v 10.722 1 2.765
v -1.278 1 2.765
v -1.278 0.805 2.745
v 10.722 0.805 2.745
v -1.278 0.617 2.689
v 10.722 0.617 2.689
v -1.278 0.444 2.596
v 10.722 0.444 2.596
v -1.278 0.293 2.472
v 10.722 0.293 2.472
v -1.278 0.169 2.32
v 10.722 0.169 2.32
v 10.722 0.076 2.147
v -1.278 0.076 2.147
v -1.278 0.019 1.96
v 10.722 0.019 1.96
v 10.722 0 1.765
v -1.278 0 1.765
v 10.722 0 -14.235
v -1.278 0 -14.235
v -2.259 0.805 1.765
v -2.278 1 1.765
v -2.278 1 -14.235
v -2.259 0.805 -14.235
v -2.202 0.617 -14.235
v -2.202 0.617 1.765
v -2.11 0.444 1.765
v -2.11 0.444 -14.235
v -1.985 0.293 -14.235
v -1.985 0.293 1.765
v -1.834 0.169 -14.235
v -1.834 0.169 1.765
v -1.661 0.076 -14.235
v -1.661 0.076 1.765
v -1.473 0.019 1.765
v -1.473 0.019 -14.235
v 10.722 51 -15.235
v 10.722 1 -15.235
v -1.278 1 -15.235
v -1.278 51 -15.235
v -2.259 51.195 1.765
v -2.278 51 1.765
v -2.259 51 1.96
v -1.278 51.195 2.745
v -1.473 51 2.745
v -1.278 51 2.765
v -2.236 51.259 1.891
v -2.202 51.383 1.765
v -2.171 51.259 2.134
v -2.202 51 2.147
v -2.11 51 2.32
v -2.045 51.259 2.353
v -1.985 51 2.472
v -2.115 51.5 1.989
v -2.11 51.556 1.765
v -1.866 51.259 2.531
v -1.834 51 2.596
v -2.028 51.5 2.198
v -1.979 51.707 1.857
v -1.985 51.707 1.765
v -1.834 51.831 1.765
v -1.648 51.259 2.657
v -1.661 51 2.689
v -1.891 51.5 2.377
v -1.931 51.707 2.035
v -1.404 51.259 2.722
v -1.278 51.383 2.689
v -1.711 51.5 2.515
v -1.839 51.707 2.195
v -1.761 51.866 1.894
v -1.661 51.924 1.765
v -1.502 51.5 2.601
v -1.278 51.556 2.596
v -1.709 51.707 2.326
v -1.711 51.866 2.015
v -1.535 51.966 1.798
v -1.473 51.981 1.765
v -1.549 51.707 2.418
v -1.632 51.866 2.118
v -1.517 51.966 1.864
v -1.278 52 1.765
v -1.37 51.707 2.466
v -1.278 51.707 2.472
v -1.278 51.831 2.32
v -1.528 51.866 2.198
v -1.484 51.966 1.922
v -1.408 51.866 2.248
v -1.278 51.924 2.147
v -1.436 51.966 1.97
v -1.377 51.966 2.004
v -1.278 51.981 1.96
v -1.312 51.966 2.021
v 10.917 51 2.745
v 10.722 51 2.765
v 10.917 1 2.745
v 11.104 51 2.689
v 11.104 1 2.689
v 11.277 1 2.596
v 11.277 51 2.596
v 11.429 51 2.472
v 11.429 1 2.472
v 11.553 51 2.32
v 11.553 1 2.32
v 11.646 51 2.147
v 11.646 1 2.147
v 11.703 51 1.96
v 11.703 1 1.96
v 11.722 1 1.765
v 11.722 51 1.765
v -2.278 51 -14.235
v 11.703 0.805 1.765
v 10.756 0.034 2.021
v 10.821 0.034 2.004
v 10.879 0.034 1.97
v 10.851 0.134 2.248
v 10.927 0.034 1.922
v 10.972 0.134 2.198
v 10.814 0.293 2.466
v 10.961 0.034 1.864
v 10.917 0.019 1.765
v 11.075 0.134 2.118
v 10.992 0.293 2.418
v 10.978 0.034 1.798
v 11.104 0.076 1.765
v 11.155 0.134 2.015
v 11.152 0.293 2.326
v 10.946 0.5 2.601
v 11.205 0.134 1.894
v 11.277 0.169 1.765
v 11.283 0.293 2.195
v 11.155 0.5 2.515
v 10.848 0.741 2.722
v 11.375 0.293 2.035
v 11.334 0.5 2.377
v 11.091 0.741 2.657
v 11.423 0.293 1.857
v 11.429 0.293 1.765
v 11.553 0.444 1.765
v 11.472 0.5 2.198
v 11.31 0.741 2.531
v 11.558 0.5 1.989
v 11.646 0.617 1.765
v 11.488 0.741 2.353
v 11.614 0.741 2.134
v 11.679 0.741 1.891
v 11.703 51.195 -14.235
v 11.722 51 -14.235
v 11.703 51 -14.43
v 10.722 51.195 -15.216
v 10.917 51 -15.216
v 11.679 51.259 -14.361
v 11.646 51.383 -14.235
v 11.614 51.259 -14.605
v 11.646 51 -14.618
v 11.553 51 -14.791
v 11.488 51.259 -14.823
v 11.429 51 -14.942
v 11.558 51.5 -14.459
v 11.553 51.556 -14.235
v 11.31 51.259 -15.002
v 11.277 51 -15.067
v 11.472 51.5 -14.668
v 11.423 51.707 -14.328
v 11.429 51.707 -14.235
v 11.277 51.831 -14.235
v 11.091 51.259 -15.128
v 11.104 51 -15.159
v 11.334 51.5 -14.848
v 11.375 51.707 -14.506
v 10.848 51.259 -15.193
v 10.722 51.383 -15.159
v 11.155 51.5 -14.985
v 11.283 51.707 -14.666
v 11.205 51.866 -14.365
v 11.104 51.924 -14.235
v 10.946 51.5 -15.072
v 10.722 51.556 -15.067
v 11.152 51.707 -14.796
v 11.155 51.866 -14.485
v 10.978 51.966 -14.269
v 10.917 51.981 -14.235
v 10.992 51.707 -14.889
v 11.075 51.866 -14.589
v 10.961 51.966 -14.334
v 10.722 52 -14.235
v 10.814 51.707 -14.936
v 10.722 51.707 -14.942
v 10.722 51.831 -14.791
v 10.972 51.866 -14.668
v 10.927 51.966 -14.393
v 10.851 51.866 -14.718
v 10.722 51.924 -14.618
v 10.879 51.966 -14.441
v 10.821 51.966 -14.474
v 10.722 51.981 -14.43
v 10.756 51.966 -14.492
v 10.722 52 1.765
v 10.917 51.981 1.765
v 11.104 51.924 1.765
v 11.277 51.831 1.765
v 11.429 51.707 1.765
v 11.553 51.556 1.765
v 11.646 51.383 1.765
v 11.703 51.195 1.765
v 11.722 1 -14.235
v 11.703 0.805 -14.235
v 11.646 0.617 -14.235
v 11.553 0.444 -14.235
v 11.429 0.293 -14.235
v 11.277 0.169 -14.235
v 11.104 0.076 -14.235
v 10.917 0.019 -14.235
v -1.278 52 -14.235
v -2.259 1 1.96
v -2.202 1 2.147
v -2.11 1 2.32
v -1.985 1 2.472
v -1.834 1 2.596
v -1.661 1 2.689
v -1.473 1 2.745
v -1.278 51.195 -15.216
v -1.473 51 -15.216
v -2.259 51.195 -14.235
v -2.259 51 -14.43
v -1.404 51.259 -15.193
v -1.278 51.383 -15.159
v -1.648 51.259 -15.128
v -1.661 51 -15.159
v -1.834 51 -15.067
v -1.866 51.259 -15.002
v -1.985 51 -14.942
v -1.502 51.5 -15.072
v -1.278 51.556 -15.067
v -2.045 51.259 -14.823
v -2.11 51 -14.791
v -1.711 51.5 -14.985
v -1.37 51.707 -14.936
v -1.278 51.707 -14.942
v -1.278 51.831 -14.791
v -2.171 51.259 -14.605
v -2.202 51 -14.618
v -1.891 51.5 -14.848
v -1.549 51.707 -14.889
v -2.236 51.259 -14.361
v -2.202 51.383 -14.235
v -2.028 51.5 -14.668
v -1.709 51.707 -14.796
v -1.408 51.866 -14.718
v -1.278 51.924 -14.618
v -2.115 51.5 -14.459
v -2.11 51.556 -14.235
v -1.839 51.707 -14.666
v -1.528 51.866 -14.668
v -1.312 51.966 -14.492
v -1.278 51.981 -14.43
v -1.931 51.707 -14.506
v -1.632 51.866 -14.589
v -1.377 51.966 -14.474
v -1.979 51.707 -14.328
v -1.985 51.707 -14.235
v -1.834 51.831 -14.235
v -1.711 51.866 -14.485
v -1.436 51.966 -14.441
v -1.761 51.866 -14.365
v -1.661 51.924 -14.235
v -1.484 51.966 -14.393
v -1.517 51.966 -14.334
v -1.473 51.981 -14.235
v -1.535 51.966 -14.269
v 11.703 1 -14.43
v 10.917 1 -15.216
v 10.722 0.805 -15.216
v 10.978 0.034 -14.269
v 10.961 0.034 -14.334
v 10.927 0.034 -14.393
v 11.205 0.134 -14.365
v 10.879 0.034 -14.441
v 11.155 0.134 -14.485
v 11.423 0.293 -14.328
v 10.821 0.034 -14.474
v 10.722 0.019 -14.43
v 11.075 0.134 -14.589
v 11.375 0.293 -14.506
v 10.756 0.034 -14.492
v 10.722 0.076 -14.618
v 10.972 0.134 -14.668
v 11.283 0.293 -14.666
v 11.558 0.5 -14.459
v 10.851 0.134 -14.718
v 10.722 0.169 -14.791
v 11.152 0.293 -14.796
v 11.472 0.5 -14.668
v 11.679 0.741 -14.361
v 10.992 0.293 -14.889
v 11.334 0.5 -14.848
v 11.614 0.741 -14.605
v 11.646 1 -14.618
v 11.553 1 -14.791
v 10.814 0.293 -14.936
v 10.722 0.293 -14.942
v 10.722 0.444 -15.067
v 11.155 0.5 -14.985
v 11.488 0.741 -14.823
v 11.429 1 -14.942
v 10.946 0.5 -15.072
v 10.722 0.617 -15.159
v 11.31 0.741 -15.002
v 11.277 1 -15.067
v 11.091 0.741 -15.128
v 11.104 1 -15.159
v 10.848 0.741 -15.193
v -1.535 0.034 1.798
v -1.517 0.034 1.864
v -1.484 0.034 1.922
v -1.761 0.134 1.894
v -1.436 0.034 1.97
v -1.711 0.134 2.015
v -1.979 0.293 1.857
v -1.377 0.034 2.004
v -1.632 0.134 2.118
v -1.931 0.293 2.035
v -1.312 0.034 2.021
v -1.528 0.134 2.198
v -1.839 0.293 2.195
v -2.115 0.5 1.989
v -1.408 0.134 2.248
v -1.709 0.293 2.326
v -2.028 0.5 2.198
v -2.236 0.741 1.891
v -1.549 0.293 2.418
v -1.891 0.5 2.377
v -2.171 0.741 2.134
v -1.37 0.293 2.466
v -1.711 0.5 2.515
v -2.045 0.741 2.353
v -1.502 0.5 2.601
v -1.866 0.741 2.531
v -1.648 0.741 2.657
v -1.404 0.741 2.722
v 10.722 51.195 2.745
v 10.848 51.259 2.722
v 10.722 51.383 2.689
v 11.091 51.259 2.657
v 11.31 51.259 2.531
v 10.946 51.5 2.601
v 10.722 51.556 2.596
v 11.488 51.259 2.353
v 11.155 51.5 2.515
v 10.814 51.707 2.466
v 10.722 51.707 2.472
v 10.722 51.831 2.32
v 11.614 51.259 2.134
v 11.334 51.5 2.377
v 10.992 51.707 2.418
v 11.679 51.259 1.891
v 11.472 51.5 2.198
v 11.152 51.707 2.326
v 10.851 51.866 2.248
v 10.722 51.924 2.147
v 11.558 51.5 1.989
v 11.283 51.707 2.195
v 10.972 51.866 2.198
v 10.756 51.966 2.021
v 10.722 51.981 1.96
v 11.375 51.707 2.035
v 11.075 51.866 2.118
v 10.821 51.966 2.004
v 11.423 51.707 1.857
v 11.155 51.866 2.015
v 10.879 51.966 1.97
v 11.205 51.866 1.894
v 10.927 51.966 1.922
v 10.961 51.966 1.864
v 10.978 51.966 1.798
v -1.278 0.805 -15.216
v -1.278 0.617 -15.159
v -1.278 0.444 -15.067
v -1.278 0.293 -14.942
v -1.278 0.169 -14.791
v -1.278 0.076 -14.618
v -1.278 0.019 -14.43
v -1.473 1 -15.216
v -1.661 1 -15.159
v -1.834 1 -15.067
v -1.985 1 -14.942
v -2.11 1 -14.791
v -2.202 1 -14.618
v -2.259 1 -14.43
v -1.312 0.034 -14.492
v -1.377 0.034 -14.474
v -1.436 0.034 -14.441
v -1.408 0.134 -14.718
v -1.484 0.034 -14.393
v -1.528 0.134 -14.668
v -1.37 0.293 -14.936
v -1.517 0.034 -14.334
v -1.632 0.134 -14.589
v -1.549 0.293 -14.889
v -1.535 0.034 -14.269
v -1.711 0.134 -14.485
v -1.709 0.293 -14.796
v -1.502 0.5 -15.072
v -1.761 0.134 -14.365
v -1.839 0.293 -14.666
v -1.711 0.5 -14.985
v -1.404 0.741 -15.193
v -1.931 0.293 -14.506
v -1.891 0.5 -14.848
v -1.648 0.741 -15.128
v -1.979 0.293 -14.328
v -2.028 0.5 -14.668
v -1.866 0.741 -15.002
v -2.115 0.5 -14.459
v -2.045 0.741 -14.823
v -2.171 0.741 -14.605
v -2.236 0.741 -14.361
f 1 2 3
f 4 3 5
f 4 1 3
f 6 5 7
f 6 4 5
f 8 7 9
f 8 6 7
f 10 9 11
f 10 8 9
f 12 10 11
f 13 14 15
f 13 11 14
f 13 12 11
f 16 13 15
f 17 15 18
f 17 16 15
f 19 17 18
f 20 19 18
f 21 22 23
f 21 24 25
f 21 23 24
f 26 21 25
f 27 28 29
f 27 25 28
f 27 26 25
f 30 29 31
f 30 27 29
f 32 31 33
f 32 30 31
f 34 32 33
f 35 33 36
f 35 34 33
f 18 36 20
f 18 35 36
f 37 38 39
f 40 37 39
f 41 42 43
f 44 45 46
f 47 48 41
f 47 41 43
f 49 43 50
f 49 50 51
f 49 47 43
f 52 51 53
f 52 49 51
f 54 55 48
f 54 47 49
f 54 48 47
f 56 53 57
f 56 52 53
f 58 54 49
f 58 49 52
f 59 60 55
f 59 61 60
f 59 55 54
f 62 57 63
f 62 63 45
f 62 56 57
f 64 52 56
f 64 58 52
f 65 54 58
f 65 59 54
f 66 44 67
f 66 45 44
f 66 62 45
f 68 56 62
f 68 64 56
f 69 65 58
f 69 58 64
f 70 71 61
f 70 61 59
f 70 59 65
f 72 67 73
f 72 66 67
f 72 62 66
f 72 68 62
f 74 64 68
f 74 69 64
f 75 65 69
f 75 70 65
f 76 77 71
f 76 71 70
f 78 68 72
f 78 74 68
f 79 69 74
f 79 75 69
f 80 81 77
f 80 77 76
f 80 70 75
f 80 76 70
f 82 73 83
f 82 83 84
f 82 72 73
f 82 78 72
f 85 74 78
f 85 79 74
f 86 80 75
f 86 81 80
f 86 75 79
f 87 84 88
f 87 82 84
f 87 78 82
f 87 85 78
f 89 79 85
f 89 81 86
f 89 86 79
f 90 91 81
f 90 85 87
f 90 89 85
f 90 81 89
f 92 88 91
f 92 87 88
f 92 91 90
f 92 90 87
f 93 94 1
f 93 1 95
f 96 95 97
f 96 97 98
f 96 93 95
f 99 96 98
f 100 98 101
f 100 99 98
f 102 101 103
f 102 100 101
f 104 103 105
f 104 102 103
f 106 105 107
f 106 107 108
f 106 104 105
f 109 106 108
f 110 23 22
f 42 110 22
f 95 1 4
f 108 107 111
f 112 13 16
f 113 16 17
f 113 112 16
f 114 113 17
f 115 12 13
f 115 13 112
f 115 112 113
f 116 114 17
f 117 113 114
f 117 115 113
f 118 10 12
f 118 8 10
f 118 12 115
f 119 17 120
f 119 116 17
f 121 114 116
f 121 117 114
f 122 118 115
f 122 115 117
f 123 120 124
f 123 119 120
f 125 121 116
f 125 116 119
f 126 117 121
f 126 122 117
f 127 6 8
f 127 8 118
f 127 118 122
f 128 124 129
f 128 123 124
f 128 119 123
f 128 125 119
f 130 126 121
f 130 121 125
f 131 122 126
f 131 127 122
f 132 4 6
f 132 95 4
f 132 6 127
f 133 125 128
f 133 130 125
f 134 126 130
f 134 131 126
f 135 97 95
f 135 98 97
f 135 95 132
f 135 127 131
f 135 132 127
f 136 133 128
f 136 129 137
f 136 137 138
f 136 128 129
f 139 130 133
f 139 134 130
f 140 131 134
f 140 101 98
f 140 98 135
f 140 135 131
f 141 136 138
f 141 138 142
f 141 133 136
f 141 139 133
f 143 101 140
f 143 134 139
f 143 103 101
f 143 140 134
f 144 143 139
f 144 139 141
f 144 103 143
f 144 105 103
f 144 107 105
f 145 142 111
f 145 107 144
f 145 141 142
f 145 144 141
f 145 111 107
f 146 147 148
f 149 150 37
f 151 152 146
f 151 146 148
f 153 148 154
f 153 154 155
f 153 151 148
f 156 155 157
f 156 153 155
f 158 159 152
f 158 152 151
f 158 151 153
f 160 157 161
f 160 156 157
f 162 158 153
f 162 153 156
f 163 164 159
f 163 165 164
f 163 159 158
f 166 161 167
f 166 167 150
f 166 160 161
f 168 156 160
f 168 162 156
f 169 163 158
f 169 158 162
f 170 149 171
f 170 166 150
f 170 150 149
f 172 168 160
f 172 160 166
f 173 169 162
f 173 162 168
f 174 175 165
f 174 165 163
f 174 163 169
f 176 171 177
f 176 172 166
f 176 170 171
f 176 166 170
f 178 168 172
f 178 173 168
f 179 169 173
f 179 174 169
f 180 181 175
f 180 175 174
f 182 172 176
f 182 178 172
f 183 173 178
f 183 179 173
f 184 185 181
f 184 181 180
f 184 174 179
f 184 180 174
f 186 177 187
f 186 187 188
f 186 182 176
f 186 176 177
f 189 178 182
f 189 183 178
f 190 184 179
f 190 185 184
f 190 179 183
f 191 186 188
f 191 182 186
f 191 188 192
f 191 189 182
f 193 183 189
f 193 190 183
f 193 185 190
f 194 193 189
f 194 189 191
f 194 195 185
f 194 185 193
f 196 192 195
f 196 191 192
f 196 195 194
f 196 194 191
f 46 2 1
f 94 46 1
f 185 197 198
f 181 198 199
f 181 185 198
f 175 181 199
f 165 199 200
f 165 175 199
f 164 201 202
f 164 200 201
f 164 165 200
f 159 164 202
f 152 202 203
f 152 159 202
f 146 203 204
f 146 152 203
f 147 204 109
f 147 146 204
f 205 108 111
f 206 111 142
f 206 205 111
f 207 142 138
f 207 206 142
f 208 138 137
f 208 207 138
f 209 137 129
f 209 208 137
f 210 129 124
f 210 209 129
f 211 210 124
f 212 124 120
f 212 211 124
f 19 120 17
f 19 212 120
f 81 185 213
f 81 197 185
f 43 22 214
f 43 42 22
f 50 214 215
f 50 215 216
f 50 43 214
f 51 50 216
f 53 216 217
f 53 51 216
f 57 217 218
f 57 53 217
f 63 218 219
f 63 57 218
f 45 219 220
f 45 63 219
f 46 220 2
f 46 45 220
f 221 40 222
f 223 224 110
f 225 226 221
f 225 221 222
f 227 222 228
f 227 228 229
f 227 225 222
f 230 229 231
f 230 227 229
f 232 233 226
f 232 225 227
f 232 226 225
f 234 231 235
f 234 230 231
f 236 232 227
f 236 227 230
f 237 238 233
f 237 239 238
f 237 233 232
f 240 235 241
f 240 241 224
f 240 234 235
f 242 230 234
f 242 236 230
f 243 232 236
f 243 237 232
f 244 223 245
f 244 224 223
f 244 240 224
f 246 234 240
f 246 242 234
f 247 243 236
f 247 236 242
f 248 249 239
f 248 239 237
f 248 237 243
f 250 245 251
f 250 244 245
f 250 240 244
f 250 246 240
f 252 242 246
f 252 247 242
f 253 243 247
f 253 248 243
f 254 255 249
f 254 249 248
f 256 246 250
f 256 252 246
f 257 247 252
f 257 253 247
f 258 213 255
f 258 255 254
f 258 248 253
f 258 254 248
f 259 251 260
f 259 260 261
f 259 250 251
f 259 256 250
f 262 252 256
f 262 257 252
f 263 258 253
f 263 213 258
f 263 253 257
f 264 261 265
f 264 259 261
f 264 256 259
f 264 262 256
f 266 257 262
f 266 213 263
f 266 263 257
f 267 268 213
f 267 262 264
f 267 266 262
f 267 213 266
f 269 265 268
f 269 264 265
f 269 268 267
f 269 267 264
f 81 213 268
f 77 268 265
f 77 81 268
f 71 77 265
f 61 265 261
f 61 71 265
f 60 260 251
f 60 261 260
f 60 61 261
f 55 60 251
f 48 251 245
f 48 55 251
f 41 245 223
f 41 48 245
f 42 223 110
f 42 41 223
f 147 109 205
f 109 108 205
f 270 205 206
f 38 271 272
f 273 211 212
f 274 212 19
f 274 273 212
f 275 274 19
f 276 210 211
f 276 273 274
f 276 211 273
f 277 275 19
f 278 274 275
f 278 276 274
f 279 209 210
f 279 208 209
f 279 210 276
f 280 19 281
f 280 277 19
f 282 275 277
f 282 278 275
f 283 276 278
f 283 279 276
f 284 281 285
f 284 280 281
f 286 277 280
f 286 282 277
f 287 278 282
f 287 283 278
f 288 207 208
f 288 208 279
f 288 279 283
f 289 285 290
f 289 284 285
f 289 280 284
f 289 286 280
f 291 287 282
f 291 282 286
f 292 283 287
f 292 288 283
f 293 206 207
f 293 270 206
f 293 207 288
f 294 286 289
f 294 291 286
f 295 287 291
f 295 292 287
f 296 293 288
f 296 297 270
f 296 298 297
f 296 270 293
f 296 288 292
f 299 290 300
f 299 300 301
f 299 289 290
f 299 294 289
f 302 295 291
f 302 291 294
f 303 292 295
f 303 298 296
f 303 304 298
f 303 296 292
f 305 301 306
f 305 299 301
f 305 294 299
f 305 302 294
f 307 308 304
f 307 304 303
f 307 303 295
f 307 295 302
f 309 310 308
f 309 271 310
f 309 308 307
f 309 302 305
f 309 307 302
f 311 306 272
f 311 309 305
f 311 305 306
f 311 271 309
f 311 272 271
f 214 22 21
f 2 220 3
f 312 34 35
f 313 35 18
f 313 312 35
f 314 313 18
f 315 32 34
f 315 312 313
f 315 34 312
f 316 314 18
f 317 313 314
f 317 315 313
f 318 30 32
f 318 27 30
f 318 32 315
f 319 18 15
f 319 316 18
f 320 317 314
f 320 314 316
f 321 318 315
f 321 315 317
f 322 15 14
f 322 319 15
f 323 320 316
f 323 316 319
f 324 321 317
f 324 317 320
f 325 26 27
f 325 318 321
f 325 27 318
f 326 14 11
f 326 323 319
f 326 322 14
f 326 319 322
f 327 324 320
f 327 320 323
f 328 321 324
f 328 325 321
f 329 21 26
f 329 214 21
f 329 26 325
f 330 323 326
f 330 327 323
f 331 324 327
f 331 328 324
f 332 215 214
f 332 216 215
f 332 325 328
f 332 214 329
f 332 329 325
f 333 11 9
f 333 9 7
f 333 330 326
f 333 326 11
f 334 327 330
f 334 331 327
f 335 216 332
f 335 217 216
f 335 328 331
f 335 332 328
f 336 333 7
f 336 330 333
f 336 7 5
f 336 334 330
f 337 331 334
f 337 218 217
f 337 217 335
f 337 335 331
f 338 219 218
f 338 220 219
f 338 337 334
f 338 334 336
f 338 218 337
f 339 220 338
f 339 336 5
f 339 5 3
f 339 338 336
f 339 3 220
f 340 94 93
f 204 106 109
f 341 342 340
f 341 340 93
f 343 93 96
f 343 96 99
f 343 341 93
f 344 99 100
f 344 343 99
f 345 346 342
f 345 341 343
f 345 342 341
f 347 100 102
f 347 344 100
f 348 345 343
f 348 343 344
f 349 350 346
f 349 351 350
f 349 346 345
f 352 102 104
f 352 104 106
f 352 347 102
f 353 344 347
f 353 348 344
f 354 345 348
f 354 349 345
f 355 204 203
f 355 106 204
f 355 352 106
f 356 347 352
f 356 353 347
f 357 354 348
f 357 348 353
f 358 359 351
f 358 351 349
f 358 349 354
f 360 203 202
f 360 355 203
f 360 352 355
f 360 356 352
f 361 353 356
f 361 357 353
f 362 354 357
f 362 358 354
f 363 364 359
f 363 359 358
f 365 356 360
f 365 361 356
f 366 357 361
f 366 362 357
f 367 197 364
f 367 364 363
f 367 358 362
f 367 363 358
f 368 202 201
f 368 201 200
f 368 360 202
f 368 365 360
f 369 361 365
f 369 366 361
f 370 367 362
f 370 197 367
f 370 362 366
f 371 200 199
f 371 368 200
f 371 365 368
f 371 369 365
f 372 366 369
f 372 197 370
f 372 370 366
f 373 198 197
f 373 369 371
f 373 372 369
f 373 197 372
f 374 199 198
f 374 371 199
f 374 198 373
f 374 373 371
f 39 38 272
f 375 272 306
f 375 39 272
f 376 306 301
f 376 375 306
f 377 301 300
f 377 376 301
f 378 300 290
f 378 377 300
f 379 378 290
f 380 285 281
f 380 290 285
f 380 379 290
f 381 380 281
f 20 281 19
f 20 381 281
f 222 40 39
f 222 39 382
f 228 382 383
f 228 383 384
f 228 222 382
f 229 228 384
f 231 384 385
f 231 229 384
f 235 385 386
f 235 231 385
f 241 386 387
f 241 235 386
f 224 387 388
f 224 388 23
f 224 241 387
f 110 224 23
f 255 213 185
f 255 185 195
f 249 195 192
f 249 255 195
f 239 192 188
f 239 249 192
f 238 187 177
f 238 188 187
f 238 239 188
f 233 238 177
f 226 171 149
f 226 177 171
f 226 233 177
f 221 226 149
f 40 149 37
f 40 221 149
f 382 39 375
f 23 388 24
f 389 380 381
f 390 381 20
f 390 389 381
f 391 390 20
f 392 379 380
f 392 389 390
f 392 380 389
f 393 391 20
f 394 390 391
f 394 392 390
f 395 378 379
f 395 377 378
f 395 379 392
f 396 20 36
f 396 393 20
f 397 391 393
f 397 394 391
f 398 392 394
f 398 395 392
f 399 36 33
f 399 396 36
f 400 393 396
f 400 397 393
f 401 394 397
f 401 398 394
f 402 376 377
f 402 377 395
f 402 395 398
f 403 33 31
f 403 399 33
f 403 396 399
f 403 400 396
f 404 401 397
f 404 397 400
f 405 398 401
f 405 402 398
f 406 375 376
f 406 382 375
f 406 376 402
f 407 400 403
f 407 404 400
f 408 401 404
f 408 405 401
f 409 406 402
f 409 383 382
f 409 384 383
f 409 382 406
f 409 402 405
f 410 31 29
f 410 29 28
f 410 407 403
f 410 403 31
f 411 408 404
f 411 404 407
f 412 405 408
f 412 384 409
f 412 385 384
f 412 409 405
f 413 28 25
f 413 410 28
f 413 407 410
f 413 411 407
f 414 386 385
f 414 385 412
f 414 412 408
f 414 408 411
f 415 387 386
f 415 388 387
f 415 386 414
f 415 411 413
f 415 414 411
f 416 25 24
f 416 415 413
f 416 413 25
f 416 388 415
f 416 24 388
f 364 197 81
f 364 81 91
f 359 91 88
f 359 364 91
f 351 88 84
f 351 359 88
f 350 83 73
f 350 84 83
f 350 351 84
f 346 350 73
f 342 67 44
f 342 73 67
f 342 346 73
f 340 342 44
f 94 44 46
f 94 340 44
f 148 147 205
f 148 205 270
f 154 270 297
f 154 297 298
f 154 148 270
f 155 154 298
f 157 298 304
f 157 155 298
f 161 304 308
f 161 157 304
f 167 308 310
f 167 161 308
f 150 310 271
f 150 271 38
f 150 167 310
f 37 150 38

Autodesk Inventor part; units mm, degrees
ref_plane "YZ Plane" through (0, 0, 0) normal (1, 0, 0) x (0, 1, 0)
ref_plane "XZ Plane" through (0, 0, 0) normal (0, 1, 0) x (-1, 0, 0)
ref_plane "XY Plane" through (0, 0, 0) normal (0, 0, 1) x (1, 0, 0)
sketch "Szkic1" plane through (0, 0, 0) normal (0, 1, 0) x (-1, 0, 0)
  line L0 (2.2782, 2.7647) -> (-11.7218, 2.7647)
  line L1 (-11.7218, 2.7647) -> (-11.7218, -15.2353)
  line L2 (-11.7218, -15.2353) -> (2.2782, -15.2353)
  line L3 (2.2782, -15.2353) -> (2.2782, 2.7647)
  point P0 (0, 0)
  dimension "d0" = 14
  dimension "d1" = 18
extrude "Wyciągnięcie proste1" add sketch "Szkic1" along normal blind 52
fillet "Zaokrąglenie1" radius 1 4 edges at (-2.2782, 26, -15.2353) (11.7218, 26, -15.2353) (-2.2782, 26, 2.7647) (11.7218, 26, 2.7647)
fillet "Zaokrąglenie2" radius 1 16 edges at (-1.9853, 0, 2.4719) (4.7218, 0, 2.7647) (11.429, 0, 2.4719) (11.7218, 0, -6.2353) (11.429, 0, -14.9424) (4.7218, 0, -15.2353) (-1.9853, 0, -14.9424) (-2.2782, 0, -6.2353) (-1.9853, 52, 2.4719) (4.7218, 52, 2.7647) (11.429, 52, 2.4719) (11.7218, 52, -6.2353) (11.429, 52, -14.9424) (4.7218, 52, -15.2353) (-1.9853, 52, -14.9424) (-2.2782, 52, -6.2353)
properties part number "li-pol_520"
